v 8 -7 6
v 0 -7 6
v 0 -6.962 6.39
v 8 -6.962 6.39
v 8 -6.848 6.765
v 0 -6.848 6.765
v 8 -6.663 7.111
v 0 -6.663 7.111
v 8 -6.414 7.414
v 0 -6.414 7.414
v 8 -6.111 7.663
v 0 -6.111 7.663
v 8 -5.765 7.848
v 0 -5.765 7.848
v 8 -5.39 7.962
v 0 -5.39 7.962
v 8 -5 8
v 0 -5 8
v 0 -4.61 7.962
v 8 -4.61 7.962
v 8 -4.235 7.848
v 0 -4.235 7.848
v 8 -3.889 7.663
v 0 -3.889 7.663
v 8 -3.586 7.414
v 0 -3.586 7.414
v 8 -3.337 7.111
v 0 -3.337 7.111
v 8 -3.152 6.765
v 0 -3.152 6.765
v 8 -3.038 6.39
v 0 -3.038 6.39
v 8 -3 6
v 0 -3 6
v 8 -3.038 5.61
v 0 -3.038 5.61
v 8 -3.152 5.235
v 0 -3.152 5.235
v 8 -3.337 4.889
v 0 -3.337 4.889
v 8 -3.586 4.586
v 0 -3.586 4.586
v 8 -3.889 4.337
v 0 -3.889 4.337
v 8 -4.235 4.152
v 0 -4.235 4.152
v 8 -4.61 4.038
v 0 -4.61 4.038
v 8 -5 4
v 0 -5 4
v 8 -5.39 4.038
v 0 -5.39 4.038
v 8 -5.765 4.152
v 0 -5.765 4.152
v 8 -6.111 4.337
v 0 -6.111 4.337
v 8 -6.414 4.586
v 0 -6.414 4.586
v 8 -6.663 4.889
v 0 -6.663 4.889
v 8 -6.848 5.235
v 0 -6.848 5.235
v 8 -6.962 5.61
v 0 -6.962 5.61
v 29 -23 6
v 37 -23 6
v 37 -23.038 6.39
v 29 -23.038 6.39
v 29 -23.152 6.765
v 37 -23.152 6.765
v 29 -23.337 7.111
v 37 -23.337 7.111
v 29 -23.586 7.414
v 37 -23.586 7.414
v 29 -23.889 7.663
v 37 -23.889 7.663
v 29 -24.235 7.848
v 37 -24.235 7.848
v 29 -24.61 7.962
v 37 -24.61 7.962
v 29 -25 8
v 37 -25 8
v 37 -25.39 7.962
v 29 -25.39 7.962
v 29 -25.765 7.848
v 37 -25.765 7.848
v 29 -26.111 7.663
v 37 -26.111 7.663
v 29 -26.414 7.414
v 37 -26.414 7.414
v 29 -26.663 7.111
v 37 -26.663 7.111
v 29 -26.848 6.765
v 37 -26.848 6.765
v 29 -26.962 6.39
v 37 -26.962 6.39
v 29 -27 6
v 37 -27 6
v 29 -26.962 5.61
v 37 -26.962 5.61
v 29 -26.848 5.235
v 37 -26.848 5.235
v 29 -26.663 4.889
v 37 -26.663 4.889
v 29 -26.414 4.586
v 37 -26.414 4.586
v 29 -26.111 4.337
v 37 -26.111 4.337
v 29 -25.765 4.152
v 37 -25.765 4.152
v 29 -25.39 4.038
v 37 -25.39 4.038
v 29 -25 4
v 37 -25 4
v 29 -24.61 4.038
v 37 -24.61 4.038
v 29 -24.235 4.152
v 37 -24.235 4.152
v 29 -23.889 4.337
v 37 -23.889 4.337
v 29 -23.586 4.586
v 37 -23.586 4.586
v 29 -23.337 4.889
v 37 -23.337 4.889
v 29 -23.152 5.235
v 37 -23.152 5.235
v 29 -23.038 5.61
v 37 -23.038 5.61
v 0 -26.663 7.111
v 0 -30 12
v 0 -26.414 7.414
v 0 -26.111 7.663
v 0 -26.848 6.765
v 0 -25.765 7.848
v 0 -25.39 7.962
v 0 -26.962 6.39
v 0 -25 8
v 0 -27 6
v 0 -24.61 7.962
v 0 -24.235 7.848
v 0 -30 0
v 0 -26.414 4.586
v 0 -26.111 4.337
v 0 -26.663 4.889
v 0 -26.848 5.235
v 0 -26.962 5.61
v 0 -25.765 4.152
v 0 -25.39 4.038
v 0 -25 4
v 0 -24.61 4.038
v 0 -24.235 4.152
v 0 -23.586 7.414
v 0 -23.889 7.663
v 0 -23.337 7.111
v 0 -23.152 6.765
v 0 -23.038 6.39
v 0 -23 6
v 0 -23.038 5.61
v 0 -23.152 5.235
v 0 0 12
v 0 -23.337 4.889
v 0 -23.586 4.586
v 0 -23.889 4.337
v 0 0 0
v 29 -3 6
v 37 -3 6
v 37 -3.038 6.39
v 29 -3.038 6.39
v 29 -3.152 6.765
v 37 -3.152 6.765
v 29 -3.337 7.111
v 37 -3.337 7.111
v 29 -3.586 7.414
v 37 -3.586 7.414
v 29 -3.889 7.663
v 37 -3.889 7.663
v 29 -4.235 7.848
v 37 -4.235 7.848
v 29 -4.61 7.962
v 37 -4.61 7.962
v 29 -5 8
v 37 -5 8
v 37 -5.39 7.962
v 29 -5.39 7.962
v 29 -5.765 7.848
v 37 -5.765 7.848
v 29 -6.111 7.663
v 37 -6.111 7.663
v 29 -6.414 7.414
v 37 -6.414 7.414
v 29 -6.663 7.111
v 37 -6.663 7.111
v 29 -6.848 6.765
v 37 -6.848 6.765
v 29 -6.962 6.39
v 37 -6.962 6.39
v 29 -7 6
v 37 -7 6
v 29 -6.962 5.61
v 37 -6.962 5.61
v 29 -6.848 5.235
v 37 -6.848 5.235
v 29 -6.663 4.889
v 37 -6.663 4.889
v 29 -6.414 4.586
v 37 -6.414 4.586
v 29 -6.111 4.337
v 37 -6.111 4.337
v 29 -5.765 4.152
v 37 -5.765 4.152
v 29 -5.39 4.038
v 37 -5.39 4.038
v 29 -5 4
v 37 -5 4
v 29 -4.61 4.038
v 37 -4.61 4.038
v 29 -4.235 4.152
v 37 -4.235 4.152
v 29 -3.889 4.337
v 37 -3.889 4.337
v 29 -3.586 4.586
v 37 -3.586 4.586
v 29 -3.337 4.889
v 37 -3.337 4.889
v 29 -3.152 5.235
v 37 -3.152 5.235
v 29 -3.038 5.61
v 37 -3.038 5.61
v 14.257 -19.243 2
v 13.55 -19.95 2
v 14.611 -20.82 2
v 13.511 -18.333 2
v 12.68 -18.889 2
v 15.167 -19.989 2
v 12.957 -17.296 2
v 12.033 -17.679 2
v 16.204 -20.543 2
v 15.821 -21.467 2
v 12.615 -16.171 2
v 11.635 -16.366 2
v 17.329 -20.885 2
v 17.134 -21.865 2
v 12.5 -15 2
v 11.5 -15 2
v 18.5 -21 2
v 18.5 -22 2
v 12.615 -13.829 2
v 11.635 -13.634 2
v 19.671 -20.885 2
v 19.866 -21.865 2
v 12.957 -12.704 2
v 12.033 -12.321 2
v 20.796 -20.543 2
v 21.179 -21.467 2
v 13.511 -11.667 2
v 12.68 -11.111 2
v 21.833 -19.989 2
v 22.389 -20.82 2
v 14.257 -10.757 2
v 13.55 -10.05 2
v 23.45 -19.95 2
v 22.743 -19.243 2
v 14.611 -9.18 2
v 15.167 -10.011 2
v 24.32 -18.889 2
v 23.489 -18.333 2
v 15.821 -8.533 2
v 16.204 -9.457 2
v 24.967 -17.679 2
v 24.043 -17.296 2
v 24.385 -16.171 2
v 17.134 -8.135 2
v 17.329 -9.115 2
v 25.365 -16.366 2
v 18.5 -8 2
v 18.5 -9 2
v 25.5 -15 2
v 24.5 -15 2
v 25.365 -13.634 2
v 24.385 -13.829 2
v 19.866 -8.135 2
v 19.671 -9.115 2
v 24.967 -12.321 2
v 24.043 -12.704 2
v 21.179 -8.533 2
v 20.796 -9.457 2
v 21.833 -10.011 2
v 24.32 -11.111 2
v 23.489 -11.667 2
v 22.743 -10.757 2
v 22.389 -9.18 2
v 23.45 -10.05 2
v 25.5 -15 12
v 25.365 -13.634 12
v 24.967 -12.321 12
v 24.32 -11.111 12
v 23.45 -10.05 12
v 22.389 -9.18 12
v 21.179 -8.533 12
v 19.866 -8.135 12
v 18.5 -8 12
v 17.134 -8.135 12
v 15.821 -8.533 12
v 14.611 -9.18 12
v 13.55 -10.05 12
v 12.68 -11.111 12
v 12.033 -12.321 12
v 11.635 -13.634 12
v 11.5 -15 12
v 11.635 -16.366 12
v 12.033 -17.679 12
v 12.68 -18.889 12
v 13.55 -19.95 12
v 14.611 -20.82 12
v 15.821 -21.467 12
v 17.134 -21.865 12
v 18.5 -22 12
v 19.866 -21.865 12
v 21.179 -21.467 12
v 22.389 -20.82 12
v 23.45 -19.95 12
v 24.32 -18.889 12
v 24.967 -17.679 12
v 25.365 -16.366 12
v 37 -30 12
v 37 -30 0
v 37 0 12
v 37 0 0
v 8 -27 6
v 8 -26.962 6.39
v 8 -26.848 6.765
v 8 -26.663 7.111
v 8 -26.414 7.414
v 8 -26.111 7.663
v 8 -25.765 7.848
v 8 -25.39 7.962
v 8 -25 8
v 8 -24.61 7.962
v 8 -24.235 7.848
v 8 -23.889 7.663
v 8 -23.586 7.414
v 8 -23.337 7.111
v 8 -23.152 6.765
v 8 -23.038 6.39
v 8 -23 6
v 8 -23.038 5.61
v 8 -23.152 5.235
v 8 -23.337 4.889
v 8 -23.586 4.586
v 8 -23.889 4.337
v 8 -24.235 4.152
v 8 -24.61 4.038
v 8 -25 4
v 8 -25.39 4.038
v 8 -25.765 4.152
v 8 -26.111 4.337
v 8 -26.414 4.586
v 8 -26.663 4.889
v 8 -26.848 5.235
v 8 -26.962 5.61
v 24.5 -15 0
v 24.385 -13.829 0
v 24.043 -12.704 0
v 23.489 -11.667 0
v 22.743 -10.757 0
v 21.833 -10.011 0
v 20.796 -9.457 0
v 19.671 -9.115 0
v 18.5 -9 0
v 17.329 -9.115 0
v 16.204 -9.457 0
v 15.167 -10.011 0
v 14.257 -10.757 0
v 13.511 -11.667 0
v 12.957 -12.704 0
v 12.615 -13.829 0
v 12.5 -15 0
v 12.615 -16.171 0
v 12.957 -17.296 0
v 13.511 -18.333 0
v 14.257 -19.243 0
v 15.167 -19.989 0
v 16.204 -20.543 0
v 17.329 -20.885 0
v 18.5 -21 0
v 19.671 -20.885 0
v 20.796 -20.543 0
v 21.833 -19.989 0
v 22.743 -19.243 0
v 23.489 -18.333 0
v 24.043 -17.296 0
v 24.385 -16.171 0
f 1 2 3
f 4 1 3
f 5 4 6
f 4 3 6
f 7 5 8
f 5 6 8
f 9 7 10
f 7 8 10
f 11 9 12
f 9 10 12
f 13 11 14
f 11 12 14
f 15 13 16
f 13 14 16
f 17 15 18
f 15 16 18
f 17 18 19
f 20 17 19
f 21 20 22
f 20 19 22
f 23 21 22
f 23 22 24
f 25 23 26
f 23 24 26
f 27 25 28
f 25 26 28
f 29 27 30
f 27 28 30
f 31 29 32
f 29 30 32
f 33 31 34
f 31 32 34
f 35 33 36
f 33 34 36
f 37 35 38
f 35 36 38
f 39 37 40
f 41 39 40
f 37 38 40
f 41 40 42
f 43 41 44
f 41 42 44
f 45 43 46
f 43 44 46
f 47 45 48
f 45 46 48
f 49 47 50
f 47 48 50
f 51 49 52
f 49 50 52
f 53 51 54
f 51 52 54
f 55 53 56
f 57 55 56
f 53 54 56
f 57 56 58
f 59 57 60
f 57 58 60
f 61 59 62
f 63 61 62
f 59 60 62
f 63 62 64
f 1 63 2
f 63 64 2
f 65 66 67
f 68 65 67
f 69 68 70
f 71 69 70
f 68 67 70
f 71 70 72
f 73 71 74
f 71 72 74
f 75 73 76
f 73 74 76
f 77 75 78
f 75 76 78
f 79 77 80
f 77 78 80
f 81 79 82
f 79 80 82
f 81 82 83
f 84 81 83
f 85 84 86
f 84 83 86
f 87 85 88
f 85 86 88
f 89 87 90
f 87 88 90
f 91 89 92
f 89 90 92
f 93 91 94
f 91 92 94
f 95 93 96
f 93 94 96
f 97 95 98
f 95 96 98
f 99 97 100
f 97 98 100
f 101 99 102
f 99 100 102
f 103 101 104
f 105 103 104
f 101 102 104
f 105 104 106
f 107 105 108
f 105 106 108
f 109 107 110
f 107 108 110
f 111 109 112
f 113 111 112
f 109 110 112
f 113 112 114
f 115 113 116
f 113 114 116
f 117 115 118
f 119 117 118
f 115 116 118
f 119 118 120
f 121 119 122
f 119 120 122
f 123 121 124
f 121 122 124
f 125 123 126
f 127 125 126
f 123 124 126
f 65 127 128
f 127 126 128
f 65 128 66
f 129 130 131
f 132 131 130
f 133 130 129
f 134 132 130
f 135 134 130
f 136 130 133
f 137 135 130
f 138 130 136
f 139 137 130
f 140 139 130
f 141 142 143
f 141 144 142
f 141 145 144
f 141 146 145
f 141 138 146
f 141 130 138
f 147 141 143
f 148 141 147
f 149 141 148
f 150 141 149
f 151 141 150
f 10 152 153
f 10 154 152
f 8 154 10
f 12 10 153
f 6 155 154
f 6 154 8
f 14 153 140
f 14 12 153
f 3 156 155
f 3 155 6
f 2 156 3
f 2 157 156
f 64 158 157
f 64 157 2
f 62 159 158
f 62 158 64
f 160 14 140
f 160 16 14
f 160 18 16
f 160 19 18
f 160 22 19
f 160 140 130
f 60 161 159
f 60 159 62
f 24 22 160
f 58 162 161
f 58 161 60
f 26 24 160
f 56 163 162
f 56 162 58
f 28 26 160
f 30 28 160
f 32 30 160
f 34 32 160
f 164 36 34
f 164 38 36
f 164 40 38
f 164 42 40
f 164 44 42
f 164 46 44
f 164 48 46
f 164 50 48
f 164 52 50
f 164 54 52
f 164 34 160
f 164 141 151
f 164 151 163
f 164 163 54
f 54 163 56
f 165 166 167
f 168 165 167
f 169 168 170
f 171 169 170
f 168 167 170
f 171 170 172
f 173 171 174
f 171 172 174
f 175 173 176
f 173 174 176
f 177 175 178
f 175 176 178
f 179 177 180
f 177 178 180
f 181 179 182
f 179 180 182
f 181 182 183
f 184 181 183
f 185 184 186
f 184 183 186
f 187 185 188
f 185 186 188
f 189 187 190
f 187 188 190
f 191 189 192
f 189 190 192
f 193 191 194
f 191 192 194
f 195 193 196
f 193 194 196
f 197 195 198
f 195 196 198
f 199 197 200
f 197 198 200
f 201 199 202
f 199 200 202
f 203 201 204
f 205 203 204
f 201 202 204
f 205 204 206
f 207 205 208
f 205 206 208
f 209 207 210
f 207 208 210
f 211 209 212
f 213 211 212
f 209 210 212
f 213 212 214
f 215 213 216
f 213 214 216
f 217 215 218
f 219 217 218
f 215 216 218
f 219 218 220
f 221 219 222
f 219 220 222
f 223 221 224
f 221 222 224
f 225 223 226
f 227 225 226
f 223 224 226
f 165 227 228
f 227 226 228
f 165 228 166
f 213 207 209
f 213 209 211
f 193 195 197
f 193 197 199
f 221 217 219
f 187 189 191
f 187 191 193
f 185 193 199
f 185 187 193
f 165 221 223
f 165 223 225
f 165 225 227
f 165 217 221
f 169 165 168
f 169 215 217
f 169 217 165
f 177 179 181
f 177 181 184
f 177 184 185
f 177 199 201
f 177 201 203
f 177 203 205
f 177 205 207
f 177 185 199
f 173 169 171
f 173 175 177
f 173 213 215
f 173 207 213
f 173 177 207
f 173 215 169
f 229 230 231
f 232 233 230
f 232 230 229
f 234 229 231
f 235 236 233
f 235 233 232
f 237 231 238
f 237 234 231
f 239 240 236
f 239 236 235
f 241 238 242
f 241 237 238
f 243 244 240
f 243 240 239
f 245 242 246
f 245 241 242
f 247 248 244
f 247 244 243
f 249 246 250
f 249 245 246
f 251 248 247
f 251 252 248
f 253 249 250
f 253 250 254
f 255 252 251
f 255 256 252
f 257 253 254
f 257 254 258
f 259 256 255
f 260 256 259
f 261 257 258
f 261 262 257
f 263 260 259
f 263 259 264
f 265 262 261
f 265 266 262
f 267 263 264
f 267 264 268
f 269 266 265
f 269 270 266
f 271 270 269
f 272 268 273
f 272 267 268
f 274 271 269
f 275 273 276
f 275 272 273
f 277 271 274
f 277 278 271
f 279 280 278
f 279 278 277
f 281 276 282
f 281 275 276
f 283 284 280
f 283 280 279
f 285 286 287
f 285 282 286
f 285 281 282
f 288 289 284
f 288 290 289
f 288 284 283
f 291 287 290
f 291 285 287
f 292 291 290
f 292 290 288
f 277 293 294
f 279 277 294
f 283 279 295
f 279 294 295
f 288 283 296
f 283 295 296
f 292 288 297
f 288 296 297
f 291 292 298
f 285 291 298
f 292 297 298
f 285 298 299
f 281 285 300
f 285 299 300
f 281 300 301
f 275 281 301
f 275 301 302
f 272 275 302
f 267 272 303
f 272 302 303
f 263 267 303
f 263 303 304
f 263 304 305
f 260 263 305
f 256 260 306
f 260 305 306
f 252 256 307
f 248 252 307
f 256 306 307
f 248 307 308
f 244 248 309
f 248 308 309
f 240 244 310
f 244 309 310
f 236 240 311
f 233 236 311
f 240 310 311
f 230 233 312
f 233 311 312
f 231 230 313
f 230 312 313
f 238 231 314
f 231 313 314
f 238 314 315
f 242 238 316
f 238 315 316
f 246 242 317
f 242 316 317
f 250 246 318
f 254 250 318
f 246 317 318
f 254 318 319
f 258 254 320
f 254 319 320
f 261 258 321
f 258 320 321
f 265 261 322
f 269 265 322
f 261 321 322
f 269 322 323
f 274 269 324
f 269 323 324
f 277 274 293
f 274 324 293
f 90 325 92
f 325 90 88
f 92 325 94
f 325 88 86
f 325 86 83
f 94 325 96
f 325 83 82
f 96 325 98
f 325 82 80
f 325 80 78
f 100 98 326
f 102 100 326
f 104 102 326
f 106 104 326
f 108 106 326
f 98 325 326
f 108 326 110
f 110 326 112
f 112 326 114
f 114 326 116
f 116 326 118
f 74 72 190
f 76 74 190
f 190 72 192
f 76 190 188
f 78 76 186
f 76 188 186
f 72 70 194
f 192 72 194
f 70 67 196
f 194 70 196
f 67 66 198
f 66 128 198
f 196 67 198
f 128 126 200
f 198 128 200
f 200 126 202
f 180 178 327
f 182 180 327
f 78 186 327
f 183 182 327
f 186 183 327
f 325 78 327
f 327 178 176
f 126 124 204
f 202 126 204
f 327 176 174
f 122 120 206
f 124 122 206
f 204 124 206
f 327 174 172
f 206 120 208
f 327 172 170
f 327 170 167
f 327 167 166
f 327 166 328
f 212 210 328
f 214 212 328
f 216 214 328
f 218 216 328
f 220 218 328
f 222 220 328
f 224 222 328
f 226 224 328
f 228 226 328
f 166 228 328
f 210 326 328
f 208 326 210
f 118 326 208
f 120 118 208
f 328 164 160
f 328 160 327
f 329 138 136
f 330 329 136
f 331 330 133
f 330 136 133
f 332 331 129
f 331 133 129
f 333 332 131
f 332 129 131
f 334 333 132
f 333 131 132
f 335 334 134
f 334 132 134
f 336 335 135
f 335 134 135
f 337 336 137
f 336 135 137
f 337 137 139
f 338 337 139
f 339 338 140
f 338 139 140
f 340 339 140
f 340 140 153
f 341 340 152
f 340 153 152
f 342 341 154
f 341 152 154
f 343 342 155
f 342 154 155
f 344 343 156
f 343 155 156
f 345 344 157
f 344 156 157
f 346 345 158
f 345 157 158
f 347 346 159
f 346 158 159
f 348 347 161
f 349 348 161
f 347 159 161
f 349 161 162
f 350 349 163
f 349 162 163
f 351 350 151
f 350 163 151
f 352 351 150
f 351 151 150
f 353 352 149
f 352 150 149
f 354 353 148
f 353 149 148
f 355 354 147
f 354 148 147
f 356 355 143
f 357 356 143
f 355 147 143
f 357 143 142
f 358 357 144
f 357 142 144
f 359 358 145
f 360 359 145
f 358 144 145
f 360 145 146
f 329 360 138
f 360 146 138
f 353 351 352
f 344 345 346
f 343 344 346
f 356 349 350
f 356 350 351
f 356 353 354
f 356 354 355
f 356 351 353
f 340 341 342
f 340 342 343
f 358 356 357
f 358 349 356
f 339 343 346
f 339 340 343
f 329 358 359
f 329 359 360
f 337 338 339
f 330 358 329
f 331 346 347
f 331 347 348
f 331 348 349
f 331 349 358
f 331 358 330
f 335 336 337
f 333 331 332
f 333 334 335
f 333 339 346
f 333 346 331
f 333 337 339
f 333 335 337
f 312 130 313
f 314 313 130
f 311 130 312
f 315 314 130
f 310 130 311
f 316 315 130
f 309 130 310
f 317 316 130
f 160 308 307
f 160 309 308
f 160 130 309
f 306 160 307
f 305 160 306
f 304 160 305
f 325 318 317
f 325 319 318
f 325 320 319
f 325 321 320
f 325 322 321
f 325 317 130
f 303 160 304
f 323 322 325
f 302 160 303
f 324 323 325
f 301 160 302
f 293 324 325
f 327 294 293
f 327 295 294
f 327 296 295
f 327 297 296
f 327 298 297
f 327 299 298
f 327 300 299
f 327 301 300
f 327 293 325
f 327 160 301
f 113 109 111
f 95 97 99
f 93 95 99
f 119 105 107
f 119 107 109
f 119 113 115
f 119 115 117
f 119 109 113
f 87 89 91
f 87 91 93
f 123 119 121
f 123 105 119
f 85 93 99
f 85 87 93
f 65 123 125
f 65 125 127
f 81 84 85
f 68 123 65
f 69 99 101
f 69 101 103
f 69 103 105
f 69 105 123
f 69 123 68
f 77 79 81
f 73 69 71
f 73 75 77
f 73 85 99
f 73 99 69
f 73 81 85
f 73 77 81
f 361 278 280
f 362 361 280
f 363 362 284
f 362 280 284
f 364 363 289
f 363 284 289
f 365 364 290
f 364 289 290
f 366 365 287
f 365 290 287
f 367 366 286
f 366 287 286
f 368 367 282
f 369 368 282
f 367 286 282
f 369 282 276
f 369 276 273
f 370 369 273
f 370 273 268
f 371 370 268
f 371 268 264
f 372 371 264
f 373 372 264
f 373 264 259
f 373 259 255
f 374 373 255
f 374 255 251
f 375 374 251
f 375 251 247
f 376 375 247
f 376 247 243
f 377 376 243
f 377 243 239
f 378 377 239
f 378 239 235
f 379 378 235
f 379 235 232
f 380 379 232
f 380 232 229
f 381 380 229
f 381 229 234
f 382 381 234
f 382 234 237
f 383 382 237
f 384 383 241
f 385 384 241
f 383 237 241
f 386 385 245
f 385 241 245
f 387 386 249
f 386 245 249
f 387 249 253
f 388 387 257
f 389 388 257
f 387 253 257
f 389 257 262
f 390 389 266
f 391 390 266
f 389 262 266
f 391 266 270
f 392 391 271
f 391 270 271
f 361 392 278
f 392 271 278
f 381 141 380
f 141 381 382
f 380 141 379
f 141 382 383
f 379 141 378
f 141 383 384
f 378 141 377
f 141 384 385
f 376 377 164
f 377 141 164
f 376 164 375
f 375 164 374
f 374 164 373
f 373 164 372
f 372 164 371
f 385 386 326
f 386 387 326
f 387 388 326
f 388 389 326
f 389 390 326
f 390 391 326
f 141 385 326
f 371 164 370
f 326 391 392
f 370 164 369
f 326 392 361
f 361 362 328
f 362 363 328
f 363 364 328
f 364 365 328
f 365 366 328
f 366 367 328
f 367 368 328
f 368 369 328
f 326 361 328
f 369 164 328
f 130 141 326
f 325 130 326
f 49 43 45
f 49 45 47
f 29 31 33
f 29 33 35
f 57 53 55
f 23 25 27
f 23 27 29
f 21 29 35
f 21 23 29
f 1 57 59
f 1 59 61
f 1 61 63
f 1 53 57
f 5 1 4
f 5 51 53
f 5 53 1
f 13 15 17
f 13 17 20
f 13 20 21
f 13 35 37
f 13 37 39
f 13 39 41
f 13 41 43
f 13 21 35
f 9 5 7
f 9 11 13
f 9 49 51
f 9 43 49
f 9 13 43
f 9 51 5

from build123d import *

# Parameters (mm, degrees)
F0_W     = 37
F0_H     = 30
F1_DEPTH = 12
F2_R     = 7
F3_DEPTH = 10
F4_R     = 2
F5_DEPTH = 8
F6_R     = 2
F7_DEPTH = 8
F8_R     = 6
F9_DEPTH = 25


with BuildPart() as f1:
    # F0 (on Top) → F1 (new body)
    with BuildSketch(Plane.XY):
        with Locations((18.5, -15)):
            Rectangle(F0_W, F0_H)
    extrude(amount=F1_DEPTH)

    # F2 (on face) → F3 (cut)
    with BuildSketch(Plane.XY.offset(12)):
        with Locations((18.5, -15)):
            Circle(F2_R)
    extrude(amount=-F3_DEPTH, mode=Mode.SUBTRACT)

    # F4 (on face) → F5 (cut)
    with BuildSketch(Plane.YZ.offset(37)):
        with Locations((-5, 6)):
            Circle(F4_R)
        with Locations((-25, 6)):
            Circle(F4_R)
    extrude(amount=-F5_DEPTH, mode=Mode.SUBTRACT)

    # F6 (on face) → F7 (cut)
    with BuildSketch(Plane(origin=(0, 0, 0), x_dir=(0, -1, 0), z_dir=(-1, 0, 0))):
        with Locations((25, 6)):
            Circle(F6_R)
        with Locations((5, 6)):
            Circle(F6_R)
    extrude(amount=-F7_DEPTH, mode=Mode.SUBTRACT)

    # F8 (on face) → F9 (cut)
    with BuildSketch(Plane.XY.offset(2)):
        with Locations((18.5, -15)):
            Circle(F8_R)
    extrude(amount=-F9_DEPTH, mode=Mode.SUBTRACT)


solid = f1.part
